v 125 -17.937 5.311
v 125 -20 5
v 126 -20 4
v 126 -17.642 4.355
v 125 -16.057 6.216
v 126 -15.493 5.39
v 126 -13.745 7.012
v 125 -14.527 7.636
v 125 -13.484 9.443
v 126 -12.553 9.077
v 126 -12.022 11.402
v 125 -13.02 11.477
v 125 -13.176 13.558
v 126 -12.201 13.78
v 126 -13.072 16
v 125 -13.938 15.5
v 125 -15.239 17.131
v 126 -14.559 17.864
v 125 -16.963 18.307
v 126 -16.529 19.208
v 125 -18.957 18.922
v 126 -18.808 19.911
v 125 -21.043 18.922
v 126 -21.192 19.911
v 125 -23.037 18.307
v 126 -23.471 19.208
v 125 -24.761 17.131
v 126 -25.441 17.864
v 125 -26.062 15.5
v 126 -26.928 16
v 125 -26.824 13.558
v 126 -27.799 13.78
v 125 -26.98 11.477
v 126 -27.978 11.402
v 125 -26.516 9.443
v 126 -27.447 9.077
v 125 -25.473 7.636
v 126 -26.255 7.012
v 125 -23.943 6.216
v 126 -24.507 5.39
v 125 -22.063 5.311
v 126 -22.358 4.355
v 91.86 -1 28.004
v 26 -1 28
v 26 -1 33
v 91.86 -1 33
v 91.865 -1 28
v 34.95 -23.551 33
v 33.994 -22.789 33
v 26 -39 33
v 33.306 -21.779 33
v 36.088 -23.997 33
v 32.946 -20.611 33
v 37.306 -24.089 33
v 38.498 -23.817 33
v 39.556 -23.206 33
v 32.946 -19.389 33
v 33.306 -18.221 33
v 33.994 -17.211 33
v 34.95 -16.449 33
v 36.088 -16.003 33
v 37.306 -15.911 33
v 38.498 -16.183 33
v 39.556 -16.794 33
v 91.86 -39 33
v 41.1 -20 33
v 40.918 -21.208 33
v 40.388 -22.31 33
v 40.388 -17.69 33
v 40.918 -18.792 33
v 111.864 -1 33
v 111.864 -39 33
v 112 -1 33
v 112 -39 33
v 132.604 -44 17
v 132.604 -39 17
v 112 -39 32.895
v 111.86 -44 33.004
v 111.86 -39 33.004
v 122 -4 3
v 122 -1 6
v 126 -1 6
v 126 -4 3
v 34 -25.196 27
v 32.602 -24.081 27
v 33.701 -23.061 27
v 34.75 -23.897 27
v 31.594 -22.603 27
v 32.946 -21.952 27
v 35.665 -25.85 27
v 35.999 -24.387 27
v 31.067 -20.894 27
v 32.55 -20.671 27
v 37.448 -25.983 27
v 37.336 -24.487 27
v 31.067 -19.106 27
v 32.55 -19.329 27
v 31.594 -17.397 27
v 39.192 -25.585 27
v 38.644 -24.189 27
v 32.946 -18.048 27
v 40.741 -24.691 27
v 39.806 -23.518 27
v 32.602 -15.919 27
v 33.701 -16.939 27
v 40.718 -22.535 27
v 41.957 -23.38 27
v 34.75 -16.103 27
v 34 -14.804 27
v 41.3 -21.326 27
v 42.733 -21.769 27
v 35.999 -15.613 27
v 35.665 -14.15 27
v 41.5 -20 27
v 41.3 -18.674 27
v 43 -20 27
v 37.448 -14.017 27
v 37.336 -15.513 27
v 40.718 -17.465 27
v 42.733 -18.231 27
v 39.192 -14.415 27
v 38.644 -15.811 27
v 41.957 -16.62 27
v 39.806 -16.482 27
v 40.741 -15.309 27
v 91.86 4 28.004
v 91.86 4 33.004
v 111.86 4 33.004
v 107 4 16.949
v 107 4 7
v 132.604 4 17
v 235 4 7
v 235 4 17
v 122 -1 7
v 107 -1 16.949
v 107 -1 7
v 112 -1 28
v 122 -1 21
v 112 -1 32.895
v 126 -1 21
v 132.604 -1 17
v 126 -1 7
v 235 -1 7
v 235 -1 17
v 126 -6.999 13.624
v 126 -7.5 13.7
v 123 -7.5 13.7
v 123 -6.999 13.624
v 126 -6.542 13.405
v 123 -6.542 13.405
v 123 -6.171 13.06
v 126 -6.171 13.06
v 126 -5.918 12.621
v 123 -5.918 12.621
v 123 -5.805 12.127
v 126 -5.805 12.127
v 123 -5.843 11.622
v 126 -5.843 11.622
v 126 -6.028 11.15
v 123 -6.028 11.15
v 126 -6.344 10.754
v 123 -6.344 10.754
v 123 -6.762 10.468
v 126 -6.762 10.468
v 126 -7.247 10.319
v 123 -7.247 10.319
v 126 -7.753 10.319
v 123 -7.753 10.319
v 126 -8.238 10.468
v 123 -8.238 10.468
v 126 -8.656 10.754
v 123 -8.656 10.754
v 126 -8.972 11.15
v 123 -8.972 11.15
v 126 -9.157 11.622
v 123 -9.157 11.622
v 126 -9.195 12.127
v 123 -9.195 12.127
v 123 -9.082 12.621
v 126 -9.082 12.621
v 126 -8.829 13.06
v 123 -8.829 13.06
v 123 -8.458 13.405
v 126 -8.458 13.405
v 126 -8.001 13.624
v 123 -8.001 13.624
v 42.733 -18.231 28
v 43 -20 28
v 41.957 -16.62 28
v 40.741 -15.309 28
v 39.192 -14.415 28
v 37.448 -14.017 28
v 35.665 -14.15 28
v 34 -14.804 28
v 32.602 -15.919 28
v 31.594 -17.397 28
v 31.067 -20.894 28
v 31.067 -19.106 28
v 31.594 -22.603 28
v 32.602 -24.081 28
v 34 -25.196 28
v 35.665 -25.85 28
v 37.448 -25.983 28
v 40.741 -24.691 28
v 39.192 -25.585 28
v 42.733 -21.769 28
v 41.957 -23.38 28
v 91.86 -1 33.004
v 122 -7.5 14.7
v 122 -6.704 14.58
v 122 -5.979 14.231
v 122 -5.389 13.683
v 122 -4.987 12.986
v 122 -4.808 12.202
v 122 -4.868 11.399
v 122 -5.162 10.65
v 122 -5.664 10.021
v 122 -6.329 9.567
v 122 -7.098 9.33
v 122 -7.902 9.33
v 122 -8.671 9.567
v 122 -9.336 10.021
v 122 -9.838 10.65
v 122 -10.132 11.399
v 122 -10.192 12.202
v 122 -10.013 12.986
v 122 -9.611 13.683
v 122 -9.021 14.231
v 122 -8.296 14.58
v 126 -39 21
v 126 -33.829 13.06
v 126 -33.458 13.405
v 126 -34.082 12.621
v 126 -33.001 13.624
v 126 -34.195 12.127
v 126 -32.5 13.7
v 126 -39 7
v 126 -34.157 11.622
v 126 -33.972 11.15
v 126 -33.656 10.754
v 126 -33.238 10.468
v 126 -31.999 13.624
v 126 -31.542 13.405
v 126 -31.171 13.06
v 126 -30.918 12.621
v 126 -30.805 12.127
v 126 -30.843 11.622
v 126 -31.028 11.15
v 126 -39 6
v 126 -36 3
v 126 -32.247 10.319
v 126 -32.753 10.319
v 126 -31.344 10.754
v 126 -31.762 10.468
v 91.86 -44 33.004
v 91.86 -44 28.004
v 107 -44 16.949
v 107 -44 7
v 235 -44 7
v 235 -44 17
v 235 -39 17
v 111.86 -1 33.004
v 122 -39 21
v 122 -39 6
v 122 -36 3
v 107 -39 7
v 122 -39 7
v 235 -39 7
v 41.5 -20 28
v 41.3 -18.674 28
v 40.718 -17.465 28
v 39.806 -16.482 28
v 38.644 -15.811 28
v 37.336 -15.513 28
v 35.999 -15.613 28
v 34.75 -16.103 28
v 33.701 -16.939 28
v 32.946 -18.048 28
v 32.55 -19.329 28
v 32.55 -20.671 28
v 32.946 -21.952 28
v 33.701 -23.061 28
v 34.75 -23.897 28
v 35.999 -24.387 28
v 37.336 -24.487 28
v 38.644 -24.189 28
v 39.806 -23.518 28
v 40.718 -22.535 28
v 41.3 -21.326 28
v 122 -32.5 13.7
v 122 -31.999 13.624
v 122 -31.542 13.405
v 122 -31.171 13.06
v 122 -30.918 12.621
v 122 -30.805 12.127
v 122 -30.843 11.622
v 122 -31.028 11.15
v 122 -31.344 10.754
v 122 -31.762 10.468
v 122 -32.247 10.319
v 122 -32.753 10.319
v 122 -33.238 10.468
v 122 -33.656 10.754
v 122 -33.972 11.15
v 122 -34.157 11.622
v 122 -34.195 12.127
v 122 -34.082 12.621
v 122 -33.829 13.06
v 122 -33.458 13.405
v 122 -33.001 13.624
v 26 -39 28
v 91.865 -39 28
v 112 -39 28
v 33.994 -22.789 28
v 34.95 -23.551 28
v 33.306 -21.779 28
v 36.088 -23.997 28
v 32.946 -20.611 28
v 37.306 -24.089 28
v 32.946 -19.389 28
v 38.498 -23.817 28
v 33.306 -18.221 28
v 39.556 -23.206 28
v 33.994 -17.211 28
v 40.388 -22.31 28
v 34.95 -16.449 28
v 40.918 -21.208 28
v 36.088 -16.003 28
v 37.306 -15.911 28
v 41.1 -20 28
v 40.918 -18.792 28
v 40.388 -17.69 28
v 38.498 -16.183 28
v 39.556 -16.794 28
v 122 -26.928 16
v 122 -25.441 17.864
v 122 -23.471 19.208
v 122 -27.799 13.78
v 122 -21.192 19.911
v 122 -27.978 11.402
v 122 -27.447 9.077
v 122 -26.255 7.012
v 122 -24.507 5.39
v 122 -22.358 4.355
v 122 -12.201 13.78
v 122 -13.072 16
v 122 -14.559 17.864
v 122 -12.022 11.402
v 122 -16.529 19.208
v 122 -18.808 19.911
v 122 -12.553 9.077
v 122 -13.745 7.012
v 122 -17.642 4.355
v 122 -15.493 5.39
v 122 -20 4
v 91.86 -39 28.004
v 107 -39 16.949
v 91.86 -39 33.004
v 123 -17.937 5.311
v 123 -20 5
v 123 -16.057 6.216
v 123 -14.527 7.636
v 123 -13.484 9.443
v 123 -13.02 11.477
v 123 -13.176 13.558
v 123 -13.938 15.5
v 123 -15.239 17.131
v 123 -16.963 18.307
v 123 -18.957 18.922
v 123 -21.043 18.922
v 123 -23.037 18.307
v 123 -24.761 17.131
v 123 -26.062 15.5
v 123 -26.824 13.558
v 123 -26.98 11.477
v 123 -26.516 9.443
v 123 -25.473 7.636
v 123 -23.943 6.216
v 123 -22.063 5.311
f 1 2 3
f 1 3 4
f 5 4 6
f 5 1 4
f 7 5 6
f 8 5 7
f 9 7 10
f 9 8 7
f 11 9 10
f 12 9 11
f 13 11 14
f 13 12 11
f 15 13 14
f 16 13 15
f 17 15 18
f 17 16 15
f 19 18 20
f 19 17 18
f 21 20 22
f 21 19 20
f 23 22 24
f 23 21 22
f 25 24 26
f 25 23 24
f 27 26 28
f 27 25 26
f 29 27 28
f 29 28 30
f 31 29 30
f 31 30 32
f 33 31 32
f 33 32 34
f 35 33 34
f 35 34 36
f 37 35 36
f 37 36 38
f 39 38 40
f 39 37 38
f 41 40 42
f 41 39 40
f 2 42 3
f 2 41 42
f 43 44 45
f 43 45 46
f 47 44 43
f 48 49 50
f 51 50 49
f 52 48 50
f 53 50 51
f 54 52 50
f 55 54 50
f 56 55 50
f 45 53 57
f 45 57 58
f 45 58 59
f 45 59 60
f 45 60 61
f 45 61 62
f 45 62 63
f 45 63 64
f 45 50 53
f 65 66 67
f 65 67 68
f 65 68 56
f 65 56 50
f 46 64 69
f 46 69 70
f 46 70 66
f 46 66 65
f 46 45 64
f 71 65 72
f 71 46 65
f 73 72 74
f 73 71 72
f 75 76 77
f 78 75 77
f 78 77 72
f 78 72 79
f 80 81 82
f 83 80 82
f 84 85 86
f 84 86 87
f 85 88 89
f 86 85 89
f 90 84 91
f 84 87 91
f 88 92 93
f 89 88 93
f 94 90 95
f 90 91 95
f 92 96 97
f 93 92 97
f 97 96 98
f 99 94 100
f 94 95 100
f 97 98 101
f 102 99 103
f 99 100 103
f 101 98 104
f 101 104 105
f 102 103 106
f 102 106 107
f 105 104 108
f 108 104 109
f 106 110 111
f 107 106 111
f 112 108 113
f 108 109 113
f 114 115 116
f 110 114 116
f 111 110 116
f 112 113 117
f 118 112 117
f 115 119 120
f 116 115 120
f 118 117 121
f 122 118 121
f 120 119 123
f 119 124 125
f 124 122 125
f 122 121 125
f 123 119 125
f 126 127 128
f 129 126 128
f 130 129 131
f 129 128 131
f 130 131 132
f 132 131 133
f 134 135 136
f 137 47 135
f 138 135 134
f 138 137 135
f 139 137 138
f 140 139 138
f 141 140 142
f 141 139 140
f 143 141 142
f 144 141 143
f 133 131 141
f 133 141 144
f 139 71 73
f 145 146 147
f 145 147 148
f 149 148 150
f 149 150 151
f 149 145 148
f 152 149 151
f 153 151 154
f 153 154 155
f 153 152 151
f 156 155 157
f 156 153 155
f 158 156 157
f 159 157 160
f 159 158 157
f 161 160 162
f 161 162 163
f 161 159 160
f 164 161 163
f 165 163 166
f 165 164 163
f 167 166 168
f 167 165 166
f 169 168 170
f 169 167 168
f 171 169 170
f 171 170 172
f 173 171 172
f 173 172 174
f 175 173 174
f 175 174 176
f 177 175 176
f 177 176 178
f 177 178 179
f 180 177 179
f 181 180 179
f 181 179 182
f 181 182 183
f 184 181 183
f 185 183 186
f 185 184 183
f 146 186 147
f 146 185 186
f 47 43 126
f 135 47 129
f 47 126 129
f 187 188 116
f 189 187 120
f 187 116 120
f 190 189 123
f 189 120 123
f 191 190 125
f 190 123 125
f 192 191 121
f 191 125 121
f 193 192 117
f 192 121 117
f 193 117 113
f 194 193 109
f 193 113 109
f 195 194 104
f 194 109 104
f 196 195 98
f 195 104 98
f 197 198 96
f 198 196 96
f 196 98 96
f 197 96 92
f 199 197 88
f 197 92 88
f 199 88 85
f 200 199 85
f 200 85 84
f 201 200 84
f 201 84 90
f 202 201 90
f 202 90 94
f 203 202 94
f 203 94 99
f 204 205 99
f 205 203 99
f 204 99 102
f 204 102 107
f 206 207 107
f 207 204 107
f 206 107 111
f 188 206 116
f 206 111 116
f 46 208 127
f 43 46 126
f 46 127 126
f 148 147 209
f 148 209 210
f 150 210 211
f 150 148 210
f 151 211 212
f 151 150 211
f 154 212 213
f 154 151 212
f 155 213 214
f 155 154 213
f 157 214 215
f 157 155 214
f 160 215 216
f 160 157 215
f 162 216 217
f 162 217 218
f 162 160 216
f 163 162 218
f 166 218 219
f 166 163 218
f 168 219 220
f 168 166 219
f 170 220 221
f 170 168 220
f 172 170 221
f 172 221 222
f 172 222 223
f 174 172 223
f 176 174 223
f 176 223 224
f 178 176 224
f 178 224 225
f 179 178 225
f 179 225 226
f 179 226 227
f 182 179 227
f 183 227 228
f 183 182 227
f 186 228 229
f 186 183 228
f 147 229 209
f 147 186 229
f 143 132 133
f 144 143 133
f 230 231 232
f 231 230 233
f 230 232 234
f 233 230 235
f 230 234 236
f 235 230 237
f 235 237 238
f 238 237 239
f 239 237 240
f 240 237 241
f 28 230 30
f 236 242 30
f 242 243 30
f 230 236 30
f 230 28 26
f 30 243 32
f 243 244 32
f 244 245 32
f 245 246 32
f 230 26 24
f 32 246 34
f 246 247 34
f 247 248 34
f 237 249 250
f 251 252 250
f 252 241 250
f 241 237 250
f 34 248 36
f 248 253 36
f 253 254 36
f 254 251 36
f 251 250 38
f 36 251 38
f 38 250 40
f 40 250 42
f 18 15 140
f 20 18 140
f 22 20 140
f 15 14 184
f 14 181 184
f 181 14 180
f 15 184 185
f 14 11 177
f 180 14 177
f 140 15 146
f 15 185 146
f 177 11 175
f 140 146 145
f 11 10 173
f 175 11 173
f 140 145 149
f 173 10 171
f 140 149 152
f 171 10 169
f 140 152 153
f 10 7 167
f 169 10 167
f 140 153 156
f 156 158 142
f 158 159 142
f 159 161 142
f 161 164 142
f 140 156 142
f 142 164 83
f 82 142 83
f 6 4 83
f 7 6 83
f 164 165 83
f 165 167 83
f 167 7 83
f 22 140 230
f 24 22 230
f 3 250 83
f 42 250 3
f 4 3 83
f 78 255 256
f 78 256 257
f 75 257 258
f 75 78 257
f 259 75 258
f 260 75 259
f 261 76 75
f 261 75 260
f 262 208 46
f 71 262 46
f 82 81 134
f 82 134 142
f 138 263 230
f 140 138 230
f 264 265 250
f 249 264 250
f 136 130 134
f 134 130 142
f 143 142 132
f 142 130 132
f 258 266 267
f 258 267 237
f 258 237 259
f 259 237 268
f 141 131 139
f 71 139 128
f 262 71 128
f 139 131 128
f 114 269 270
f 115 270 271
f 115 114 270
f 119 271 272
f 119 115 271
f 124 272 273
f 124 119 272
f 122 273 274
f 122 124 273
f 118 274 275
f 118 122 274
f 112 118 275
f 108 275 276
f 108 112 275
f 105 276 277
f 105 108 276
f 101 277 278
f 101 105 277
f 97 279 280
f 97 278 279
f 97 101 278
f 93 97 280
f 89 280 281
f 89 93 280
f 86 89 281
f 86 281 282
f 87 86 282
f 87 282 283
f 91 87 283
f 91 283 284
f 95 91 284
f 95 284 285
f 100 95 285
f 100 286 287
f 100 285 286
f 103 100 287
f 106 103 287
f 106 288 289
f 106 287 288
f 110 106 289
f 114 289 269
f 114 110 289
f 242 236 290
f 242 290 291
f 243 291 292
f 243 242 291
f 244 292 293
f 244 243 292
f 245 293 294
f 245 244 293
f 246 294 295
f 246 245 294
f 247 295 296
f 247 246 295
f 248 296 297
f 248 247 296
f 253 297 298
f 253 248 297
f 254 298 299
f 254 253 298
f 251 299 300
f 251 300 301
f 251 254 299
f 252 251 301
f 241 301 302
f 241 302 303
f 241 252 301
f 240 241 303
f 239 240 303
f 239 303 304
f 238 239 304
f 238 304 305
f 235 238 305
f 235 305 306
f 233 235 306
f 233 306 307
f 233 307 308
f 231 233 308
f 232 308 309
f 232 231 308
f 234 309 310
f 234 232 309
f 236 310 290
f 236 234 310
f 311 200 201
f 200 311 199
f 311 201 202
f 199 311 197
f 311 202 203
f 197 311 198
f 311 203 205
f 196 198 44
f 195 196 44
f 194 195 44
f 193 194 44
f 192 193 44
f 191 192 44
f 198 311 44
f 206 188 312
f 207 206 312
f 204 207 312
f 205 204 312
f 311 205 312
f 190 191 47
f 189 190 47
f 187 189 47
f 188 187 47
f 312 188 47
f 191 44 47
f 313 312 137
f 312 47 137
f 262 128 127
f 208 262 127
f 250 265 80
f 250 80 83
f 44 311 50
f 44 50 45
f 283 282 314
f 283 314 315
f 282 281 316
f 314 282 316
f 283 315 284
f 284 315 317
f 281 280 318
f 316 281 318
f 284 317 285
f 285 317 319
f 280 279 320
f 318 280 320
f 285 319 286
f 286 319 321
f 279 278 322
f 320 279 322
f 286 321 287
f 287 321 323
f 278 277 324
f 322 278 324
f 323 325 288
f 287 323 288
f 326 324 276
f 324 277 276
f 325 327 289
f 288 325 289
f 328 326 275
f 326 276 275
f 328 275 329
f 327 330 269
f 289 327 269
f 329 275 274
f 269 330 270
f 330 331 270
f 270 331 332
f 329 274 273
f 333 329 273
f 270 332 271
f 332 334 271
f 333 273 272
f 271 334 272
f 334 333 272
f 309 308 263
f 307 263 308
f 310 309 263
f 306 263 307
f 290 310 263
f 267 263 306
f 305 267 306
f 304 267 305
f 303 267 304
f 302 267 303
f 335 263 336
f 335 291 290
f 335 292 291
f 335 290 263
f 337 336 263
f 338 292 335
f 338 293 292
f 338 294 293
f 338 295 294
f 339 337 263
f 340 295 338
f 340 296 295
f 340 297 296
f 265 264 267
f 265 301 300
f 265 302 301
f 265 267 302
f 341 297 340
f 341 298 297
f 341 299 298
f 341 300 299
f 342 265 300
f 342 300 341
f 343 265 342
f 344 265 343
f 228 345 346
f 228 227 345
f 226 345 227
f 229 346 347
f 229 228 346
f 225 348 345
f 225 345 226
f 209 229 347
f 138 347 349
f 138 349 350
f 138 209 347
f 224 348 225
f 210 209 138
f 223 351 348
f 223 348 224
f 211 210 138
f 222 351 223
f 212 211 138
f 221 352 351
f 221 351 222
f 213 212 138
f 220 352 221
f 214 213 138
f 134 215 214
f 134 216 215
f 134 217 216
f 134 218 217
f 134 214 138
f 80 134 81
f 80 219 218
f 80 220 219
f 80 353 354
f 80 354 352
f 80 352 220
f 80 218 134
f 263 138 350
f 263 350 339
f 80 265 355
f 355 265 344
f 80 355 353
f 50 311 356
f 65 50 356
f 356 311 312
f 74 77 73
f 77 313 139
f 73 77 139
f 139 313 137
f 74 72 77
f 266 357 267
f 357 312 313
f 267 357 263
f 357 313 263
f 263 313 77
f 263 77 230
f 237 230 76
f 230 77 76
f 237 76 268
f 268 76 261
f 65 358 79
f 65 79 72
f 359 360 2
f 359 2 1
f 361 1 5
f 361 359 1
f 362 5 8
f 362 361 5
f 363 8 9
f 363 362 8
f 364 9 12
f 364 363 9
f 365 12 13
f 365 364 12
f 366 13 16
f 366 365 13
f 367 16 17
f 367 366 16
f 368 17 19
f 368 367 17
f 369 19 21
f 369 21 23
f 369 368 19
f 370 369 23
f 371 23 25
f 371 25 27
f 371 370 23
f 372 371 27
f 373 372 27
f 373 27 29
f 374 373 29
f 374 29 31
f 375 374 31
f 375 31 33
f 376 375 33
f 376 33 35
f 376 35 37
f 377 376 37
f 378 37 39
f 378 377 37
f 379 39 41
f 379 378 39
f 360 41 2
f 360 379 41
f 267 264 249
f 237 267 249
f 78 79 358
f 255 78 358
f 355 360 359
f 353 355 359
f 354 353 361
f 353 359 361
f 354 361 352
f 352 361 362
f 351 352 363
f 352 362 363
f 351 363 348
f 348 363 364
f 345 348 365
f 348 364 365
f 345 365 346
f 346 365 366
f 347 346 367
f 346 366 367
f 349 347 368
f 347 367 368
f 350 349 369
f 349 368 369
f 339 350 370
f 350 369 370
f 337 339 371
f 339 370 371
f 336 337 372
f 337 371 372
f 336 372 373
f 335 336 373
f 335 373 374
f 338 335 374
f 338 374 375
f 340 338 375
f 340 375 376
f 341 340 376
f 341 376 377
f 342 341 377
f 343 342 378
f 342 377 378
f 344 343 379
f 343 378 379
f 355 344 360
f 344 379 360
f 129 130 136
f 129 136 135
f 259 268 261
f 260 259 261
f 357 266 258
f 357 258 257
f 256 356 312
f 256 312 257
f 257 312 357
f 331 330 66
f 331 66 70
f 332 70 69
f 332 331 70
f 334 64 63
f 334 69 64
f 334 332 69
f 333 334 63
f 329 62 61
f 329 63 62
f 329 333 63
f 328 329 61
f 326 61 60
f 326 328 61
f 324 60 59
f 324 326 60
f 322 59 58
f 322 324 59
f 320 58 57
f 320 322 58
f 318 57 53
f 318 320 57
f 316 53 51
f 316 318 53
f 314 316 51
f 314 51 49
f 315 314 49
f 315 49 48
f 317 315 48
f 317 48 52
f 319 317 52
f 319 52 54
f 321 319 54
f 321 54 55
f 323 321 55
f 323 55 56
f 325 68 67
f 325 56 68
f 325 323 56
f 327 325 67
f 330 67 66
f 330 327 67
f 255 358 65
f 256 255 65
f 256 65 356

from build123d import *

# Parameters (mm, degrees)
EXTRUDE_DEPTH     = 5
EXTRUDE001_DEPTH  = 5
BOX054_W          = 128
BOX054_H          = 10
BOX054_DEPTH      = 5
BOX055_W          = 128
BOX055_H          = 10
BOX055_DEPTH      = 5
CYLINDER160_R     = 1.7
CYLINDER160_DEPTH = 4
CYLINDER161_R     = 1.7
CYLINDER161_DEPTH = 4
CYLINDER147_R     = 7
CYLINDER147_DEPTH = 4
BOX061_W          = 4
BOX061_H          = 38
BOX061_DEPTH      = 18
CHAMFER005_SIZE   = 1
CHAMFER006_SIZE   = 1
CYLINDER114_R     = 4.1
CYLINDER114_DEPTH = 10
TUBE_R            = 6
TUBE_R_2          = 4.5
TUBE_DEPTH        = 6
BOX053_W          = 86
BOX053_H          = 38
BOX053_DEPTH      = 5
CHAMFER007_SIZE   = 3


with BuildPart() as extrude_body:
    # Sketch → Extrude (new body)
    with BuildSketch(Plane.XZ):
        Polygon((132.822781, 16.830847), (111.859555, 33.003719), (91.859555, 33.003719), (91.859555, 28.003719), (107.162236, 16.830847), align=None)
    extrude(amount=EXTRUDE_DEPTH)


with BuildPart() as extrude_body_1:
    # Extrude placement: moved
    add(extrude_body.part.moved(Location((0, 4, 0))))


with BuildPart() as extrude001:
    # Sketch → Extrude001 (new body)
    with BuildSketch(Plane.XZ):
        Polygon((132.822781, 16.830847), (111.859555, 33.003719), (91.859555, 33.003719), (91.859555, 28.003719), (107.162236, 16.830847), align=None)
    extrude(amount=EXTRUDE001_DEPTH)


with BuildPart() as extrude001_1:
    # Extrude001 placement: moved
    add(extrude001.part.moved(Location((0, -39, 0))))


with BuildPart() as cube054:
    # Box054 → Box054 (new body)
    with BuildSketch(Plane(origin=(107, -39, 7), x_dir=(1, 0, 0), z_dir=(0, -1, 0))):
        with Locations((64, 5)):
            Rectangle(BOX054_W, BOX054_H)
    extrude(amount=BOX054_DEPTH)


with BuildPart() as cube055:
    # Box055 → Box055 (new body)
    with BuildSketch(Plane(origin=(107, 4, 7), x_dir=(1, 0, 0), z_dir=(0, -1, 0))):
        with Locations((64, 5)):
            Rectangle(BOX055_W, BOX055_H)
    extrude(amount=BOX055_DEPTH)


with BuildPart() as cylinder160:
    # Cylinder160 → Cylinder160 (new body)
    with BuildSketch(Plane(origin=(126, 0, 12), x_dir=(0, 0, 1), z_dir=(-1, 0, 0))):
        Circle(CYLINDER160_R)
    extrude(amount=CYLINDER160_DEPTH)


with BuildPart() as fusion:
    # Cylinder161 → Cylinder161 (new body)
    with BuildSketch(Plane(origin=(126, 25, 12), x_dir=(0, 0, 1), z_dir=(-1, 0, 0))):
        Circle(CYLINDER161_R)
    extrude(amount=CYLINDER161_DEPTH)

    # Fusion: union Cylinder160
    add(cylinder160.part)


with BuildPart() as fusion_1:
    # Fusion placement: moved
    add(fusion.part.moved(Location((0, -32.5, 0))))


with BuildPart() as cylinder147:
    # Cylinder147 → Cylinder147 (new body)
    with BuildSketch(Plane(origin=(122, -20, 12), x_dir=(0, 0, -1), z_dir=(1, 0, 0))):
        Circle(CYLINDER147_R)
    extrude(amount=CYLINDER147_DEPTH)


with BuildPart() as chamfer006:
    # Box061 → Box061 (new body)
    with BuildSketch(Plane(origin=(122, -39, 3), x_dir=(1, 0, 0), z_dir=(0, 0, 1))):
        with Locations((2, 19)):
            Rectangle(BOX061_W, BOX061_H)
    extrude(amount=BOX061_DEPTH)

    # Cut085: cut Cylinder147
    add(cylinder147.part, mode=Mode.SUBTRACT)

    # Cut088: cut Fusion
    add(fusion_1.part, mode=Mode.SUBTRACT)

    # Chamfer005
    chamfer005_edges = [chamfer006.edges().sort_by_distance(p)[0] for p in [
        (122, -7.5, 10.3),
        (122, -20, 19),
    ]]
    chamfer(chamfer005_edges, length=CHAMFER005_SIZE)

    # Chamfer006
    chamfer006_edges = [chamfer006.edges().sort_by_distance(p)[0] for p in [
        (126, -20, 19),
    ]]
    chamfer(chamfer006_edges, length=CHAMFER006_SIZE)


with BuildPart() as cylinder114:
    # Cylinder114 → Cylinder114 (new body)
    with BuildSketch(Plane(origin=(37, -20, 21), x_dir=(1, 0, 0), z_dir=(0, 0, 1))):
        Circle(CYLINDER114_R)
    extrude(amount=CYLINDER114_DEPTH)


with BuildPart() as tube:
    # Tube → Tube (new body)
    with BuildSketch(Plane(origin=(37, -20, 21), x_dir=(1, 0, 0), z_dir=(0, 0, 1))):
        Circle(TUBE_R)
        Circle(TUBE_R_2, mode=Mode.SUBTRACT)
    extrude(amount=TUBE_DEPTH)


with BuildPart() as chamfer007:
    # Box053 → Box053 (new body)
    with BuildSketch(Plane(origin=(26, -39, 22), x_dir=(1, 0, 0), z_dir=(0, 0, 1))):
        with Locations((43, 19)):
            Rectangle(BOX053_W, BOX053_H)
    extrude(amount=BOX053_DEPTH)

    # Fusion092: union Tube
    add(tube.part)

    # Cut073: cut Cylinder114
    add(cylinder114.part, mode=Mode.SUBTRACT)


with BuildPart() as chamfer007_1:
    # Cut073 placement: moved
    add(chamfer007.part.moved(Location((0, 0, 6))))

    # Fusion112: union Extrude body, Extrude001, Cube054, Cube055, Chamfer006
    add(extrude_body_1.part)
    add(extrude001_1.part)
    add(cube054.part)
    add(cube055.part)
    add(chamfer006.part)

    # Chamfer007
    chamfer007_edges = [chamfer007_1.edges().sort_by_distance(p)[0] for p in [
        (124, -1, 3),
        (124, -39, 3),
    ]]
    chamfer(chamfer007_edges, length=CHAMFER007_SIZE)


solid = chamfer007_1.part
